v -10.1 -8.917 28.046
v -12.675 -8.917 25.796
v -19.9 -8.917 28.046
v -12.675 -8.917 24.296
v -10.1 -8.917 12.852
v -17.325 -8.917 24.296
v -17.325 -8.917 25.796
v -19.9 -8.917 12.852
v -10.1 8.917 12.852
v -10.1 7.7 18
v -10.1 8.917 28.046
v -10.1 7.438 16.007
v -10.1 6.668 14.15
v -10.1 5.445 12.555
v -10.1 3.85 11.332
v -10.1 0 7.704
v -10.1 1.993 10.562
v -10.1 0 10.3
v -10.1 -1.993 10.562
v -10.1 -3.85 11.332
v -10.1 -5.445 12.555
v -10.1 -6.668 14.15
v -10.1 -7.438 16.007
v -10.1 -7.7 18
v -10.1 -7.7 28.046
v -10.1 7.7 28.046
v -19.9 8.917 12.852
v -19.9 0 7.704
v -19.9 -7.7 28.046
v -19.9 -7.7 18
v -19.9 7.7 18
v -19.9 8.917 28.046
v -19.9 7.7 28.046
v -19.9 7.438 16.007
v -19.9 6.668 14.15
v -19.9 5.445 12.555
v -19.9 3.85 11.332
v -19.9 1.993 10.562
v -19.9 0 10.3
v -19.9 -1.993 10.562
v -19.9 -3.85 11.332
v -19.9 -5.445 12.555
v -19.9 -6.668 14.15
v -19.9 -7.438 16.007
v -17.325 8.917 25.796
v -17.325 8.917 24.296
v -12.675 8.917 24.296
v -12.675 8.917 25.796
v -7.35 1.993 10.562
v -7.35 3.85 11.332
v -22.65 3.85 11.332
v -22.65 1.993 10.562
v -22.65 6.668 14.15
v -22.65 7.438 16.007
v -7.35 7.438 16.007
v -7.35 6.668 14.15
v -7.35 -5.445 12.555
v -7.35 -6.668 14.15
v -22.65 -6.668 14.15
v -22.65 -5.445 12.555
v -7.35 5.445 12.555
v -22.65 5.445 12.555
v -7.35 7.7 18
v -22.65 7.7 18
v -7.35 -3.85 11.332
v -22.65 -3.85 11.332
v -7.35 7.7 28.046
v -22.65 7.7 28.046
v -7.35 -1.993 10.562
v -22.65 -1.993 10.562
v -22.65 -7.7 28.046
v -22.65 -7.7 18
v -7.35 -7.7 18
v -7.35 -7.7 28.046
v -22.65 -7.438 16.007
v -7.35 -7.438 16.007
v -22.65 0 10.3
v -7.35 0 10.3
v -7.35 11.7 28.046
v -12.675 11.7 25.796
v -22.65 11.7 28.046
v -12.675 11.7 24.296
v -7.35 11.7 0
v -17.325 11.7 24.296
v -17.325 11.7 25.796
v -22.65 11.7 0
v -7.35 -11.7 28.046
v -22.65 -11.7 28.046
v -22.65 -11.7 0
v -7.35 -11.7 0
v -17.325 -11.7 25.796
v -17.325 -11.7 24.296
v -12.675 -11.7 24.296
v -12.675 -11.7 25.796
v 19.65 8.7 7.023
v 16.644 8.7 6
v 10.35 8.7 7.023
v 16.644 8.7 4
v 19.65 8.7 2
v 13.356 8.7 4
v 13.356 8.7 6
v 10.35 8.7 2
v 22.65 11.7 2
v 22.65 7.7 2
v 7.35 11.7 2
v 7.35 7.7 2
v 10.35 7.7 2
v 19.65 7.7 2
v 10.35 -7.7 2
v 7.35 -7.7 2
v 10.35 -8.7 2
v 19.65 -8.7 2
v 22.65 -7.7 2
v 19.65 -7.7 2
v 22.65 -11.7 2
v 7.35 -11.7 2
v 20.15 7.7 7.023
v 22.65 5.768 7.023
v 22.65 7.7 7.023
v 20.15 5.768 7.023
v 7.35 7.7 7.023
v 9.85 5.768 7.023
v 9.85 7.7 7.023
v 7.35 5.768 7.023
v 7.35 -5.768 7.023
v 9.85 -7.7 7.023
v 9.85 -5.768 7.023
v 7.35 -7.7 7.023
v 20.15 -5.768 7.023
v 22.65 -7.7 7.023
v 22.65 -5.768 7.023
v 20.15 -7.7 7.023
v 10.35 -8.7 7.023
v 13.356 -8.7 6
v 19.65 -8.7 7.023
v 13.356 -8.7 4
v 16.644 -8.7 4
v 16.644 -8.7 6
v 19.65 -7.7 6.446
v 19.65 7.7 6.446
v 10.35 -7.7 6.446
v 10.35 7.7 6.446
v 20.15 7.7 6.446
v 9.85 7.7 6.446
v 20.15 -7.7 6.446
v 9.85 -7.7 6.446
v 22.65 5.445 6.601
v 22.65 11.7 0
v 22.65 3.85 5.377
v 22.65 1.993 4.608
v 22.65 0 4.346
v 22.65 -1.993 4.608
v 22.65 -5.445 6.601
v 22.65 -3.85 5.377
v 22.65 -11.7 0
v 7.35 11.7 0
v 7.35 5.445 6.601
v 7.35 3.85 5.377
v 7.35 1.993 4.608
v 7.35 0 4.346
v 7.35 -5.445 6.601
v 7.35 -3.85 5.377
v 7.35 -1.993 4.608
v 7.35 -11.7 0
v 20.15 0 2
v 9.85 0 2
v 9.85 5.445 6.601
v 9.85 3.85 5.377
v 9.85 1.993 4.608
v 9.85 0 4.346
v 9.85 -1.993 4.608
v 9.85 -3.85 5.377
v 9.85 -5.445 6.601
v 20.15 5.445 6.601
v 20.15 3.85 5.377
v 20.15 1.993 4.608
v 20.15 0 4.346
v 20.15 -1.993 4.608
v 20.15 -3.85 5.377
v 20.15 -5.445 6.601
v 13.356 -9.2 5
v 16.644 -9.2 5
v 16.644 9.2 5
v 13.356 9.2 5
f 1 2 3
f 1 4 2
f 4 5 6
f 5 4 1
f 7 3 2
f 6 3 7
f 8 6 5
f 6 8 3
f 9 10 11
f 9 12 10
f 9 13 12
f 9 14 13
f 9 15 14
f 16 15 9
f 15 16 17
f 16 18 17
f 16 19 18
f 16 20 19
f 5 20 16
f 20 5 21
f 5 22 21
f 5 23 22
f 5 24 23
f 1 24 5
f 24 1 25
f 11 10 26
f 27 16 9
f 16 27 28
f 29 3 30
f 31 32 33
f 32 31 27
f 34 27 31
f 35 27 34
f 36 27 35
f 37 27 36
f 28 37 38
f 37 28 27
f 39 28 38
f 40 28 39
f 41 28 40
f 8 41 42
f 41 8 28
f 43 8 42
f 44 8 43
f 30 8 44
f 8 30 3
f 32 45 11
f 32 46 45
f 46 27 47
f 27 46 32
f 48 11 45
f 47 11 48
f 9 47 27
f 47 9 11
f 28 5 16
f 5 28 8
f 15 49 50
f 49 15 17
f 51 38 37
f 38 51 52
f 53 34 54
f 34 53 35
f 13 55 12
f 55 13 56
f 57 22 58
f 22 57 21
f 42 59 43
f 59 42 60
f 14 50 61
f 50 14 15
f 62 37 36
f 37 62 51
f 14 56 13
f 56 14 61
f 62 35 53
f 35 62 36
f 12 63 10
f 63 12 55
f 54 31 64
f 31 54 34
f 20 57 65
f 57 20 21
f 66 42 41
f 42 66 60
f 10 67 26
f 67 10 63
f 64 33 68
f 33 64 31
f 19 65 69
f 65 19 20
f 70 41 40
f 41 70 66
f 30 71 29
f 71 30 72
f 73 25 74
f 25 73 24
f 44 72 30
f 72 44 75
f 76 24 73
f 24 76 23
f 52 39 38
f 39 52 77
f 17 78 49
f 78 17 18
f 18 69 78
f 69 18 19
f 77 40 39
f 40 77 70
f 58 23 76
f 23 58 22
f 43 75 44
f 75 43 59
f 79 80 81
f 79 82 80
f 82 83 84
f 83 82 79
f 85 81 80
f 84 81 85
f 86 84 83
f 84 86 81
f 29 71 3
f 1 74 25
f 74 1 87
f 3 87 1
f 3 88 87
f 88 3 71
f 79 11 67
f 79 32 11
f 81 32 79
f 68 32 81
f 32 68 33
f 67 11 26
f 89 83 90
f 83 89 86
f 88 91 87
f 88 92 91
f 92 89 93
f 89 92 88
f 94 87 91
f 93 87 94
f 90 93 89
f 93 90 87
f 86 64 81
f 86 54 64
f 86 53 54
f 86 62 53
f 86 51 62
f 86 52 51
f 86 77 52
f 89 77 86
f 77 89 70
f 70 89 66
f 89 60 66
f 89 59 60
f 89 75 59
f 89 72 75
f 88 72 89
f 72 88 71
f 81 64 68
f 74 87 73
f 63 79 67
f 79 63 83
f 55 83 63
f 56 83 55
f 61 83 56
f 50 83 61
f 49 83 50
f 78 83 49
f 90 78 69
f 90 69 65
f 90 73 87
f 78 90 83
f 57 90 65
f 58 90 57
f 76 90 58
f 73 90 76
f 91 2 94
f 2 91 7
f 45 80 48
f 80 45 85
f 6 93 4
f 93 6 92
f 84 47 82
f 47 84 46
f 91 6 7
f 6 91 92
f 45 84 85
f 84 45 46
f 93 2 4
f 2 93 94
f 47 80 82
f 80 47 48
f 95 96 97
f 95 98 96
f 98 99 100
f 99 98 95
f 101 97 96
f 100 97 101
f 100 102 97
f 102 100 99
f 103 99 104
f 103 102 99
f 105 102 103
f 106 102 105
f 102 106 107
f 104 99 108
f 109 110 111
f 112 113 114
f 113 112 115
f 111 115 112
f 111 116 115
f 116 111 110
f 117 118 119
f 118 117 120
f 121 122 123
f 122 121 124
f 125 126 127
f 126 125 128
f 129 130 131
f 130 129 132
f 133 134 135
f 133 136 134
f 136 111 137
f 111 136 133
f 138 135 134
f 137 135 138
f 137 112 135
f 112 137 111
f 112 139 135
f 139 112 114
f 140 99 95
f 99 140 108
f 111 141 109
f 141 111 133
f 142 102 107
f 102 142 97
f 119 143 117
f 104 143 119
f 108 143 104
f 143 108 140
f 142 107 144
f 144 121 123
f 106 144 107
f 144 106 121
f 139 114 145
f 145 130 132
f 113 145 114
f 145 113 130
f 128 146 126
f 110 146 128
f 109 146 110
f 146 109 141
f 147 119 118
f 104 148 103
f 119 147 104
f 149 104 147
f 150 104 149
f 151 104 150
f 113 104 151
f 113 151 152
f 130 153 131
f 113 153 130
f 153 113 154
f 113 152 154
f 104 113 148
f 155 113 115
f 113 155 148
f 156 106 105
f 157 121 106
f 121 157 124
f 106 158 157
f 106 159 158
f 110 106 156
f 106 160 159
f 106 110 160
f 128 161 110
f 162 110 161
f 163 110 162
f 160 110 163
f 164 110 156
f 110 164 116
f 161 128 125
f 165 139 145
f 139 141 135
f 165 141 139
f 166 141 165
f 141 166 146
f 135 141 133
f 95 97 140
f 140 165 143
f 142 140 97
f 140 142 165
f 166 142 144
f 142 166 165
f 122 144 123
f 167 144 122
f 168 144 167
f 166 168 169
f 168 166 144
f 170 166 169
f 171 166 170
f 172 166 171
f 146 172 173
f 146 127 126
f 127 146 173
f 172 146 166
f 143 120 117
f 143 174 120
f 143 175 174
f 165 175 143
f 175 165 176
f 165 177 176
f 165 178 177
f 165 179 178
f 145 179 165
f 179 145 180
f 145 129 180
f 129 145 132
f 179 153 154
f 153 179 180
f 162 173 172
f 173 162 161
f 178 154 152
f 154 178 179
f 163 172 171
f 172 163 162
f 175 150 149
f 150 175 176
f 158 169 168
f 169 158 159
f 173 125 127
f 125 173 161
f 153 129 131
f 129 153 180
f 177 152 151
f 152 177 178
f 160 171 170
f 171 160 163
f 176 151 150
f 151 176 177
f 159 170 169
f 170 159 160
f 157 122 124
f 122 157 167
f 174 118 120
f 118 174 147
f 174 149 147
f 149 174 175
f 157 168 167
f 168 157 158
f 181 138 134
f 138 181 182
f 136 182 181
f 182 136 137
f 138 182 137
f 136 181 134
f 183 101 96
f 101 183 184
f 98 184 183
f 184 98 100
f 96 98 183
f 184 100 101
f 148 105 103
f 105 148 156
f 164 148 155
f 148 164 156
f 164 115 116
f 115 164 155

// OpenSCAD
// file: nut_capture.scad
use <GDMUtils.scad>

module nut_capture(nut_size=17.4, nut_thick=9.5, offset=18, slop=0.25, wall=3)
{
	nut_rad = nut_size/cos(30)/2;
	base = (offset - nut_rad);
	h = nut_rad*2 + base;
	w = nut_thick + wall*2;
	l = nut_size + wall*2;

	difference() {
		// Outer shell.
		translate([0, 0, h/2])
			cube(size=[l, w, h], center=true);

		translate([0, 0, base+nut_rad]) {
			// Nut slot.
			hull() {
				grid_of(za=[0, h]) {
					zrot(90) yrot(90) {
						cylinder(h=nut_thick+slop*2, r=nut_rad+slop, center=true, $fn=6);
					}
				}
			}
		
			// Rod access.
			hull() {
				grid_of(za=[0, h]) {
					zrot(90) yrot(90) {
						cylinder(h=w+1, r=nut_size/2-1, center=true, $fn=24);
					}
				}
			}
		}

		// Snap hole.
		translate([0, 0, h-3])
			cube(size=[l+1, nut_thick/2, 1.5], center=true);
	}
}
//!nut_capture(nut_size=17.4, nut_thick=9.5);



module nut_capture_cap(nut_size=17.4, nut_thick=9.5, wall=3, cap_thick=2)
{
	nut_rad = nut_size/cos(30)/2;
	h = nut_rad/2;
	l = nut_size + wall*2;
	w = nut_thick + wall*2;

	color("DeepSkyBlue") union() {
		// cap
		translate([0, 0, cap_thick/2])
			cube(size=[l, w, cap_thick], center=true);

		difference() {
			// Plug
			union() {
				translate([0, 0, -h/2])
					cube(size=[nut_size, nut_thick, h], center=true);
				translate([0, 0, -h/2])
					cube(size=[nut_size-2, w, h], center=true);
			}

			// Remove nut area.
			translate([0, 0, -nut_rad]) {
				zrot(90) yrot(90) {
					cylinder(h=nut_thick+1, r=nut_rad, center=true, $fn=6);
				}
			}

			// Remove Rod access.
			translate([0, 0, -nut_rad]) {
				zrot(90) yrot(90) {
					cylinder(h=w+1, r=nut_size/2-1, center=true, $fn=24);
				}
			}
		}

		// Snap ridges
		grid_of(
			xa=[-nut_size/2, nut_size/2],
			za=[-3]
		) {
			scale([1.0, nut_thick/2, 2.0])
				yrot(45) cube(size=1/sqrt(2), center=true);
		}
	}
}
!nut_capture_cap(nut_size=17.4, nut_thick=9.5);



// vim: noexpandtab tabstop=4 shiftwidth=4 softtabstop=4 nowrap
// file: z_nut_cap_part.scad
include <config.scad>
use <GDMUtils.scad>
use <nut_capture.scad>



module z_nut_cap()
{
	color("DeepSkyBlue") {
		nut_capture_cap(
			nut_size=lifter_nut_size,
			nut_thick=lifter_nut_thick,
			wall=3,
			cap_thick=2
		);
	}
}



module z_nut_cap_part() { // make me
	grid_of(ya=[-15, 15]) {
		translate([0, 0, 2])
			yrot(180) z_nut_cap();
	}
}



z_nut_cap_part();



// vim: noexpandtab tabstop=4 shiftwidth=4 softtabstop=4 nowrap
// file: config.scad
snappy_version = 0.90;


platform_length = 110; // mm.  Must be a multiple of rack_tooth_size.
platform_width  = 150; // mm
platform_height =  40; // mm
platform_thick  =   7; // mm
rack_tooth_size =   5; // mm per tooth.

rail_length  = 150;    // mm
rail_height  =  50;    // mm
rail_thick   =   7;    // mm

motor_rail_length = 100; // mm

roller_thick =  12;    // mm
roller_diam  =  30;    // mm
roller_axle  =  15;    // mm
roller_base  =  12;    // mm
roller_angle =  30;    // degrees

joiner_angle =  30;    // degrees
joiner_width =  10;    // mm
joiner_slop  =   0.5;  // mm

// Currently configured for 3/8" ACME threaded rod and matching 11/16" nut
lifter_rod_diam   =   9.5; // mm
lifter_rod_length = 300.0; // mm
lifter_nut_size   =  17.4; // mm
lifter_nut_thick  =   9.3; // mm
lifter_thread_size =  3.175; // mm lift per revolution




// Commonly used derived values.  Don't change these.
rail_spacing = platform_width - joiner_width*4 - 10;
roller_spacing = rail_spacing-roller_diam+0.5;
rail_width = rail_spacing + joiner_width*2;



// vim: noexpandtab tabstop=4 shiftwidth=4 softtabstop=4 nowrap
// main file
include <config.scad>
use <GDMUtils.scad>
use <z_nut_cap_part.scad>
use <nut_capture.scad>



module test_part() { // make me
	translate([-15, 0, 0])
		zrot(90)
			nut_capture(
				nut_size=lifter_nut_size,
				nut_thick=lifter_nut_thick,
				offset=roller_base+roller_thick/2
			);
	translate([ 15, 0, 2]) yrot(180) zrot(90) z_nut_cap();
}



test_part();



// vim: noexpandtab tabstop=4 shiftwidth=4 softtabstop=4 nowrap
